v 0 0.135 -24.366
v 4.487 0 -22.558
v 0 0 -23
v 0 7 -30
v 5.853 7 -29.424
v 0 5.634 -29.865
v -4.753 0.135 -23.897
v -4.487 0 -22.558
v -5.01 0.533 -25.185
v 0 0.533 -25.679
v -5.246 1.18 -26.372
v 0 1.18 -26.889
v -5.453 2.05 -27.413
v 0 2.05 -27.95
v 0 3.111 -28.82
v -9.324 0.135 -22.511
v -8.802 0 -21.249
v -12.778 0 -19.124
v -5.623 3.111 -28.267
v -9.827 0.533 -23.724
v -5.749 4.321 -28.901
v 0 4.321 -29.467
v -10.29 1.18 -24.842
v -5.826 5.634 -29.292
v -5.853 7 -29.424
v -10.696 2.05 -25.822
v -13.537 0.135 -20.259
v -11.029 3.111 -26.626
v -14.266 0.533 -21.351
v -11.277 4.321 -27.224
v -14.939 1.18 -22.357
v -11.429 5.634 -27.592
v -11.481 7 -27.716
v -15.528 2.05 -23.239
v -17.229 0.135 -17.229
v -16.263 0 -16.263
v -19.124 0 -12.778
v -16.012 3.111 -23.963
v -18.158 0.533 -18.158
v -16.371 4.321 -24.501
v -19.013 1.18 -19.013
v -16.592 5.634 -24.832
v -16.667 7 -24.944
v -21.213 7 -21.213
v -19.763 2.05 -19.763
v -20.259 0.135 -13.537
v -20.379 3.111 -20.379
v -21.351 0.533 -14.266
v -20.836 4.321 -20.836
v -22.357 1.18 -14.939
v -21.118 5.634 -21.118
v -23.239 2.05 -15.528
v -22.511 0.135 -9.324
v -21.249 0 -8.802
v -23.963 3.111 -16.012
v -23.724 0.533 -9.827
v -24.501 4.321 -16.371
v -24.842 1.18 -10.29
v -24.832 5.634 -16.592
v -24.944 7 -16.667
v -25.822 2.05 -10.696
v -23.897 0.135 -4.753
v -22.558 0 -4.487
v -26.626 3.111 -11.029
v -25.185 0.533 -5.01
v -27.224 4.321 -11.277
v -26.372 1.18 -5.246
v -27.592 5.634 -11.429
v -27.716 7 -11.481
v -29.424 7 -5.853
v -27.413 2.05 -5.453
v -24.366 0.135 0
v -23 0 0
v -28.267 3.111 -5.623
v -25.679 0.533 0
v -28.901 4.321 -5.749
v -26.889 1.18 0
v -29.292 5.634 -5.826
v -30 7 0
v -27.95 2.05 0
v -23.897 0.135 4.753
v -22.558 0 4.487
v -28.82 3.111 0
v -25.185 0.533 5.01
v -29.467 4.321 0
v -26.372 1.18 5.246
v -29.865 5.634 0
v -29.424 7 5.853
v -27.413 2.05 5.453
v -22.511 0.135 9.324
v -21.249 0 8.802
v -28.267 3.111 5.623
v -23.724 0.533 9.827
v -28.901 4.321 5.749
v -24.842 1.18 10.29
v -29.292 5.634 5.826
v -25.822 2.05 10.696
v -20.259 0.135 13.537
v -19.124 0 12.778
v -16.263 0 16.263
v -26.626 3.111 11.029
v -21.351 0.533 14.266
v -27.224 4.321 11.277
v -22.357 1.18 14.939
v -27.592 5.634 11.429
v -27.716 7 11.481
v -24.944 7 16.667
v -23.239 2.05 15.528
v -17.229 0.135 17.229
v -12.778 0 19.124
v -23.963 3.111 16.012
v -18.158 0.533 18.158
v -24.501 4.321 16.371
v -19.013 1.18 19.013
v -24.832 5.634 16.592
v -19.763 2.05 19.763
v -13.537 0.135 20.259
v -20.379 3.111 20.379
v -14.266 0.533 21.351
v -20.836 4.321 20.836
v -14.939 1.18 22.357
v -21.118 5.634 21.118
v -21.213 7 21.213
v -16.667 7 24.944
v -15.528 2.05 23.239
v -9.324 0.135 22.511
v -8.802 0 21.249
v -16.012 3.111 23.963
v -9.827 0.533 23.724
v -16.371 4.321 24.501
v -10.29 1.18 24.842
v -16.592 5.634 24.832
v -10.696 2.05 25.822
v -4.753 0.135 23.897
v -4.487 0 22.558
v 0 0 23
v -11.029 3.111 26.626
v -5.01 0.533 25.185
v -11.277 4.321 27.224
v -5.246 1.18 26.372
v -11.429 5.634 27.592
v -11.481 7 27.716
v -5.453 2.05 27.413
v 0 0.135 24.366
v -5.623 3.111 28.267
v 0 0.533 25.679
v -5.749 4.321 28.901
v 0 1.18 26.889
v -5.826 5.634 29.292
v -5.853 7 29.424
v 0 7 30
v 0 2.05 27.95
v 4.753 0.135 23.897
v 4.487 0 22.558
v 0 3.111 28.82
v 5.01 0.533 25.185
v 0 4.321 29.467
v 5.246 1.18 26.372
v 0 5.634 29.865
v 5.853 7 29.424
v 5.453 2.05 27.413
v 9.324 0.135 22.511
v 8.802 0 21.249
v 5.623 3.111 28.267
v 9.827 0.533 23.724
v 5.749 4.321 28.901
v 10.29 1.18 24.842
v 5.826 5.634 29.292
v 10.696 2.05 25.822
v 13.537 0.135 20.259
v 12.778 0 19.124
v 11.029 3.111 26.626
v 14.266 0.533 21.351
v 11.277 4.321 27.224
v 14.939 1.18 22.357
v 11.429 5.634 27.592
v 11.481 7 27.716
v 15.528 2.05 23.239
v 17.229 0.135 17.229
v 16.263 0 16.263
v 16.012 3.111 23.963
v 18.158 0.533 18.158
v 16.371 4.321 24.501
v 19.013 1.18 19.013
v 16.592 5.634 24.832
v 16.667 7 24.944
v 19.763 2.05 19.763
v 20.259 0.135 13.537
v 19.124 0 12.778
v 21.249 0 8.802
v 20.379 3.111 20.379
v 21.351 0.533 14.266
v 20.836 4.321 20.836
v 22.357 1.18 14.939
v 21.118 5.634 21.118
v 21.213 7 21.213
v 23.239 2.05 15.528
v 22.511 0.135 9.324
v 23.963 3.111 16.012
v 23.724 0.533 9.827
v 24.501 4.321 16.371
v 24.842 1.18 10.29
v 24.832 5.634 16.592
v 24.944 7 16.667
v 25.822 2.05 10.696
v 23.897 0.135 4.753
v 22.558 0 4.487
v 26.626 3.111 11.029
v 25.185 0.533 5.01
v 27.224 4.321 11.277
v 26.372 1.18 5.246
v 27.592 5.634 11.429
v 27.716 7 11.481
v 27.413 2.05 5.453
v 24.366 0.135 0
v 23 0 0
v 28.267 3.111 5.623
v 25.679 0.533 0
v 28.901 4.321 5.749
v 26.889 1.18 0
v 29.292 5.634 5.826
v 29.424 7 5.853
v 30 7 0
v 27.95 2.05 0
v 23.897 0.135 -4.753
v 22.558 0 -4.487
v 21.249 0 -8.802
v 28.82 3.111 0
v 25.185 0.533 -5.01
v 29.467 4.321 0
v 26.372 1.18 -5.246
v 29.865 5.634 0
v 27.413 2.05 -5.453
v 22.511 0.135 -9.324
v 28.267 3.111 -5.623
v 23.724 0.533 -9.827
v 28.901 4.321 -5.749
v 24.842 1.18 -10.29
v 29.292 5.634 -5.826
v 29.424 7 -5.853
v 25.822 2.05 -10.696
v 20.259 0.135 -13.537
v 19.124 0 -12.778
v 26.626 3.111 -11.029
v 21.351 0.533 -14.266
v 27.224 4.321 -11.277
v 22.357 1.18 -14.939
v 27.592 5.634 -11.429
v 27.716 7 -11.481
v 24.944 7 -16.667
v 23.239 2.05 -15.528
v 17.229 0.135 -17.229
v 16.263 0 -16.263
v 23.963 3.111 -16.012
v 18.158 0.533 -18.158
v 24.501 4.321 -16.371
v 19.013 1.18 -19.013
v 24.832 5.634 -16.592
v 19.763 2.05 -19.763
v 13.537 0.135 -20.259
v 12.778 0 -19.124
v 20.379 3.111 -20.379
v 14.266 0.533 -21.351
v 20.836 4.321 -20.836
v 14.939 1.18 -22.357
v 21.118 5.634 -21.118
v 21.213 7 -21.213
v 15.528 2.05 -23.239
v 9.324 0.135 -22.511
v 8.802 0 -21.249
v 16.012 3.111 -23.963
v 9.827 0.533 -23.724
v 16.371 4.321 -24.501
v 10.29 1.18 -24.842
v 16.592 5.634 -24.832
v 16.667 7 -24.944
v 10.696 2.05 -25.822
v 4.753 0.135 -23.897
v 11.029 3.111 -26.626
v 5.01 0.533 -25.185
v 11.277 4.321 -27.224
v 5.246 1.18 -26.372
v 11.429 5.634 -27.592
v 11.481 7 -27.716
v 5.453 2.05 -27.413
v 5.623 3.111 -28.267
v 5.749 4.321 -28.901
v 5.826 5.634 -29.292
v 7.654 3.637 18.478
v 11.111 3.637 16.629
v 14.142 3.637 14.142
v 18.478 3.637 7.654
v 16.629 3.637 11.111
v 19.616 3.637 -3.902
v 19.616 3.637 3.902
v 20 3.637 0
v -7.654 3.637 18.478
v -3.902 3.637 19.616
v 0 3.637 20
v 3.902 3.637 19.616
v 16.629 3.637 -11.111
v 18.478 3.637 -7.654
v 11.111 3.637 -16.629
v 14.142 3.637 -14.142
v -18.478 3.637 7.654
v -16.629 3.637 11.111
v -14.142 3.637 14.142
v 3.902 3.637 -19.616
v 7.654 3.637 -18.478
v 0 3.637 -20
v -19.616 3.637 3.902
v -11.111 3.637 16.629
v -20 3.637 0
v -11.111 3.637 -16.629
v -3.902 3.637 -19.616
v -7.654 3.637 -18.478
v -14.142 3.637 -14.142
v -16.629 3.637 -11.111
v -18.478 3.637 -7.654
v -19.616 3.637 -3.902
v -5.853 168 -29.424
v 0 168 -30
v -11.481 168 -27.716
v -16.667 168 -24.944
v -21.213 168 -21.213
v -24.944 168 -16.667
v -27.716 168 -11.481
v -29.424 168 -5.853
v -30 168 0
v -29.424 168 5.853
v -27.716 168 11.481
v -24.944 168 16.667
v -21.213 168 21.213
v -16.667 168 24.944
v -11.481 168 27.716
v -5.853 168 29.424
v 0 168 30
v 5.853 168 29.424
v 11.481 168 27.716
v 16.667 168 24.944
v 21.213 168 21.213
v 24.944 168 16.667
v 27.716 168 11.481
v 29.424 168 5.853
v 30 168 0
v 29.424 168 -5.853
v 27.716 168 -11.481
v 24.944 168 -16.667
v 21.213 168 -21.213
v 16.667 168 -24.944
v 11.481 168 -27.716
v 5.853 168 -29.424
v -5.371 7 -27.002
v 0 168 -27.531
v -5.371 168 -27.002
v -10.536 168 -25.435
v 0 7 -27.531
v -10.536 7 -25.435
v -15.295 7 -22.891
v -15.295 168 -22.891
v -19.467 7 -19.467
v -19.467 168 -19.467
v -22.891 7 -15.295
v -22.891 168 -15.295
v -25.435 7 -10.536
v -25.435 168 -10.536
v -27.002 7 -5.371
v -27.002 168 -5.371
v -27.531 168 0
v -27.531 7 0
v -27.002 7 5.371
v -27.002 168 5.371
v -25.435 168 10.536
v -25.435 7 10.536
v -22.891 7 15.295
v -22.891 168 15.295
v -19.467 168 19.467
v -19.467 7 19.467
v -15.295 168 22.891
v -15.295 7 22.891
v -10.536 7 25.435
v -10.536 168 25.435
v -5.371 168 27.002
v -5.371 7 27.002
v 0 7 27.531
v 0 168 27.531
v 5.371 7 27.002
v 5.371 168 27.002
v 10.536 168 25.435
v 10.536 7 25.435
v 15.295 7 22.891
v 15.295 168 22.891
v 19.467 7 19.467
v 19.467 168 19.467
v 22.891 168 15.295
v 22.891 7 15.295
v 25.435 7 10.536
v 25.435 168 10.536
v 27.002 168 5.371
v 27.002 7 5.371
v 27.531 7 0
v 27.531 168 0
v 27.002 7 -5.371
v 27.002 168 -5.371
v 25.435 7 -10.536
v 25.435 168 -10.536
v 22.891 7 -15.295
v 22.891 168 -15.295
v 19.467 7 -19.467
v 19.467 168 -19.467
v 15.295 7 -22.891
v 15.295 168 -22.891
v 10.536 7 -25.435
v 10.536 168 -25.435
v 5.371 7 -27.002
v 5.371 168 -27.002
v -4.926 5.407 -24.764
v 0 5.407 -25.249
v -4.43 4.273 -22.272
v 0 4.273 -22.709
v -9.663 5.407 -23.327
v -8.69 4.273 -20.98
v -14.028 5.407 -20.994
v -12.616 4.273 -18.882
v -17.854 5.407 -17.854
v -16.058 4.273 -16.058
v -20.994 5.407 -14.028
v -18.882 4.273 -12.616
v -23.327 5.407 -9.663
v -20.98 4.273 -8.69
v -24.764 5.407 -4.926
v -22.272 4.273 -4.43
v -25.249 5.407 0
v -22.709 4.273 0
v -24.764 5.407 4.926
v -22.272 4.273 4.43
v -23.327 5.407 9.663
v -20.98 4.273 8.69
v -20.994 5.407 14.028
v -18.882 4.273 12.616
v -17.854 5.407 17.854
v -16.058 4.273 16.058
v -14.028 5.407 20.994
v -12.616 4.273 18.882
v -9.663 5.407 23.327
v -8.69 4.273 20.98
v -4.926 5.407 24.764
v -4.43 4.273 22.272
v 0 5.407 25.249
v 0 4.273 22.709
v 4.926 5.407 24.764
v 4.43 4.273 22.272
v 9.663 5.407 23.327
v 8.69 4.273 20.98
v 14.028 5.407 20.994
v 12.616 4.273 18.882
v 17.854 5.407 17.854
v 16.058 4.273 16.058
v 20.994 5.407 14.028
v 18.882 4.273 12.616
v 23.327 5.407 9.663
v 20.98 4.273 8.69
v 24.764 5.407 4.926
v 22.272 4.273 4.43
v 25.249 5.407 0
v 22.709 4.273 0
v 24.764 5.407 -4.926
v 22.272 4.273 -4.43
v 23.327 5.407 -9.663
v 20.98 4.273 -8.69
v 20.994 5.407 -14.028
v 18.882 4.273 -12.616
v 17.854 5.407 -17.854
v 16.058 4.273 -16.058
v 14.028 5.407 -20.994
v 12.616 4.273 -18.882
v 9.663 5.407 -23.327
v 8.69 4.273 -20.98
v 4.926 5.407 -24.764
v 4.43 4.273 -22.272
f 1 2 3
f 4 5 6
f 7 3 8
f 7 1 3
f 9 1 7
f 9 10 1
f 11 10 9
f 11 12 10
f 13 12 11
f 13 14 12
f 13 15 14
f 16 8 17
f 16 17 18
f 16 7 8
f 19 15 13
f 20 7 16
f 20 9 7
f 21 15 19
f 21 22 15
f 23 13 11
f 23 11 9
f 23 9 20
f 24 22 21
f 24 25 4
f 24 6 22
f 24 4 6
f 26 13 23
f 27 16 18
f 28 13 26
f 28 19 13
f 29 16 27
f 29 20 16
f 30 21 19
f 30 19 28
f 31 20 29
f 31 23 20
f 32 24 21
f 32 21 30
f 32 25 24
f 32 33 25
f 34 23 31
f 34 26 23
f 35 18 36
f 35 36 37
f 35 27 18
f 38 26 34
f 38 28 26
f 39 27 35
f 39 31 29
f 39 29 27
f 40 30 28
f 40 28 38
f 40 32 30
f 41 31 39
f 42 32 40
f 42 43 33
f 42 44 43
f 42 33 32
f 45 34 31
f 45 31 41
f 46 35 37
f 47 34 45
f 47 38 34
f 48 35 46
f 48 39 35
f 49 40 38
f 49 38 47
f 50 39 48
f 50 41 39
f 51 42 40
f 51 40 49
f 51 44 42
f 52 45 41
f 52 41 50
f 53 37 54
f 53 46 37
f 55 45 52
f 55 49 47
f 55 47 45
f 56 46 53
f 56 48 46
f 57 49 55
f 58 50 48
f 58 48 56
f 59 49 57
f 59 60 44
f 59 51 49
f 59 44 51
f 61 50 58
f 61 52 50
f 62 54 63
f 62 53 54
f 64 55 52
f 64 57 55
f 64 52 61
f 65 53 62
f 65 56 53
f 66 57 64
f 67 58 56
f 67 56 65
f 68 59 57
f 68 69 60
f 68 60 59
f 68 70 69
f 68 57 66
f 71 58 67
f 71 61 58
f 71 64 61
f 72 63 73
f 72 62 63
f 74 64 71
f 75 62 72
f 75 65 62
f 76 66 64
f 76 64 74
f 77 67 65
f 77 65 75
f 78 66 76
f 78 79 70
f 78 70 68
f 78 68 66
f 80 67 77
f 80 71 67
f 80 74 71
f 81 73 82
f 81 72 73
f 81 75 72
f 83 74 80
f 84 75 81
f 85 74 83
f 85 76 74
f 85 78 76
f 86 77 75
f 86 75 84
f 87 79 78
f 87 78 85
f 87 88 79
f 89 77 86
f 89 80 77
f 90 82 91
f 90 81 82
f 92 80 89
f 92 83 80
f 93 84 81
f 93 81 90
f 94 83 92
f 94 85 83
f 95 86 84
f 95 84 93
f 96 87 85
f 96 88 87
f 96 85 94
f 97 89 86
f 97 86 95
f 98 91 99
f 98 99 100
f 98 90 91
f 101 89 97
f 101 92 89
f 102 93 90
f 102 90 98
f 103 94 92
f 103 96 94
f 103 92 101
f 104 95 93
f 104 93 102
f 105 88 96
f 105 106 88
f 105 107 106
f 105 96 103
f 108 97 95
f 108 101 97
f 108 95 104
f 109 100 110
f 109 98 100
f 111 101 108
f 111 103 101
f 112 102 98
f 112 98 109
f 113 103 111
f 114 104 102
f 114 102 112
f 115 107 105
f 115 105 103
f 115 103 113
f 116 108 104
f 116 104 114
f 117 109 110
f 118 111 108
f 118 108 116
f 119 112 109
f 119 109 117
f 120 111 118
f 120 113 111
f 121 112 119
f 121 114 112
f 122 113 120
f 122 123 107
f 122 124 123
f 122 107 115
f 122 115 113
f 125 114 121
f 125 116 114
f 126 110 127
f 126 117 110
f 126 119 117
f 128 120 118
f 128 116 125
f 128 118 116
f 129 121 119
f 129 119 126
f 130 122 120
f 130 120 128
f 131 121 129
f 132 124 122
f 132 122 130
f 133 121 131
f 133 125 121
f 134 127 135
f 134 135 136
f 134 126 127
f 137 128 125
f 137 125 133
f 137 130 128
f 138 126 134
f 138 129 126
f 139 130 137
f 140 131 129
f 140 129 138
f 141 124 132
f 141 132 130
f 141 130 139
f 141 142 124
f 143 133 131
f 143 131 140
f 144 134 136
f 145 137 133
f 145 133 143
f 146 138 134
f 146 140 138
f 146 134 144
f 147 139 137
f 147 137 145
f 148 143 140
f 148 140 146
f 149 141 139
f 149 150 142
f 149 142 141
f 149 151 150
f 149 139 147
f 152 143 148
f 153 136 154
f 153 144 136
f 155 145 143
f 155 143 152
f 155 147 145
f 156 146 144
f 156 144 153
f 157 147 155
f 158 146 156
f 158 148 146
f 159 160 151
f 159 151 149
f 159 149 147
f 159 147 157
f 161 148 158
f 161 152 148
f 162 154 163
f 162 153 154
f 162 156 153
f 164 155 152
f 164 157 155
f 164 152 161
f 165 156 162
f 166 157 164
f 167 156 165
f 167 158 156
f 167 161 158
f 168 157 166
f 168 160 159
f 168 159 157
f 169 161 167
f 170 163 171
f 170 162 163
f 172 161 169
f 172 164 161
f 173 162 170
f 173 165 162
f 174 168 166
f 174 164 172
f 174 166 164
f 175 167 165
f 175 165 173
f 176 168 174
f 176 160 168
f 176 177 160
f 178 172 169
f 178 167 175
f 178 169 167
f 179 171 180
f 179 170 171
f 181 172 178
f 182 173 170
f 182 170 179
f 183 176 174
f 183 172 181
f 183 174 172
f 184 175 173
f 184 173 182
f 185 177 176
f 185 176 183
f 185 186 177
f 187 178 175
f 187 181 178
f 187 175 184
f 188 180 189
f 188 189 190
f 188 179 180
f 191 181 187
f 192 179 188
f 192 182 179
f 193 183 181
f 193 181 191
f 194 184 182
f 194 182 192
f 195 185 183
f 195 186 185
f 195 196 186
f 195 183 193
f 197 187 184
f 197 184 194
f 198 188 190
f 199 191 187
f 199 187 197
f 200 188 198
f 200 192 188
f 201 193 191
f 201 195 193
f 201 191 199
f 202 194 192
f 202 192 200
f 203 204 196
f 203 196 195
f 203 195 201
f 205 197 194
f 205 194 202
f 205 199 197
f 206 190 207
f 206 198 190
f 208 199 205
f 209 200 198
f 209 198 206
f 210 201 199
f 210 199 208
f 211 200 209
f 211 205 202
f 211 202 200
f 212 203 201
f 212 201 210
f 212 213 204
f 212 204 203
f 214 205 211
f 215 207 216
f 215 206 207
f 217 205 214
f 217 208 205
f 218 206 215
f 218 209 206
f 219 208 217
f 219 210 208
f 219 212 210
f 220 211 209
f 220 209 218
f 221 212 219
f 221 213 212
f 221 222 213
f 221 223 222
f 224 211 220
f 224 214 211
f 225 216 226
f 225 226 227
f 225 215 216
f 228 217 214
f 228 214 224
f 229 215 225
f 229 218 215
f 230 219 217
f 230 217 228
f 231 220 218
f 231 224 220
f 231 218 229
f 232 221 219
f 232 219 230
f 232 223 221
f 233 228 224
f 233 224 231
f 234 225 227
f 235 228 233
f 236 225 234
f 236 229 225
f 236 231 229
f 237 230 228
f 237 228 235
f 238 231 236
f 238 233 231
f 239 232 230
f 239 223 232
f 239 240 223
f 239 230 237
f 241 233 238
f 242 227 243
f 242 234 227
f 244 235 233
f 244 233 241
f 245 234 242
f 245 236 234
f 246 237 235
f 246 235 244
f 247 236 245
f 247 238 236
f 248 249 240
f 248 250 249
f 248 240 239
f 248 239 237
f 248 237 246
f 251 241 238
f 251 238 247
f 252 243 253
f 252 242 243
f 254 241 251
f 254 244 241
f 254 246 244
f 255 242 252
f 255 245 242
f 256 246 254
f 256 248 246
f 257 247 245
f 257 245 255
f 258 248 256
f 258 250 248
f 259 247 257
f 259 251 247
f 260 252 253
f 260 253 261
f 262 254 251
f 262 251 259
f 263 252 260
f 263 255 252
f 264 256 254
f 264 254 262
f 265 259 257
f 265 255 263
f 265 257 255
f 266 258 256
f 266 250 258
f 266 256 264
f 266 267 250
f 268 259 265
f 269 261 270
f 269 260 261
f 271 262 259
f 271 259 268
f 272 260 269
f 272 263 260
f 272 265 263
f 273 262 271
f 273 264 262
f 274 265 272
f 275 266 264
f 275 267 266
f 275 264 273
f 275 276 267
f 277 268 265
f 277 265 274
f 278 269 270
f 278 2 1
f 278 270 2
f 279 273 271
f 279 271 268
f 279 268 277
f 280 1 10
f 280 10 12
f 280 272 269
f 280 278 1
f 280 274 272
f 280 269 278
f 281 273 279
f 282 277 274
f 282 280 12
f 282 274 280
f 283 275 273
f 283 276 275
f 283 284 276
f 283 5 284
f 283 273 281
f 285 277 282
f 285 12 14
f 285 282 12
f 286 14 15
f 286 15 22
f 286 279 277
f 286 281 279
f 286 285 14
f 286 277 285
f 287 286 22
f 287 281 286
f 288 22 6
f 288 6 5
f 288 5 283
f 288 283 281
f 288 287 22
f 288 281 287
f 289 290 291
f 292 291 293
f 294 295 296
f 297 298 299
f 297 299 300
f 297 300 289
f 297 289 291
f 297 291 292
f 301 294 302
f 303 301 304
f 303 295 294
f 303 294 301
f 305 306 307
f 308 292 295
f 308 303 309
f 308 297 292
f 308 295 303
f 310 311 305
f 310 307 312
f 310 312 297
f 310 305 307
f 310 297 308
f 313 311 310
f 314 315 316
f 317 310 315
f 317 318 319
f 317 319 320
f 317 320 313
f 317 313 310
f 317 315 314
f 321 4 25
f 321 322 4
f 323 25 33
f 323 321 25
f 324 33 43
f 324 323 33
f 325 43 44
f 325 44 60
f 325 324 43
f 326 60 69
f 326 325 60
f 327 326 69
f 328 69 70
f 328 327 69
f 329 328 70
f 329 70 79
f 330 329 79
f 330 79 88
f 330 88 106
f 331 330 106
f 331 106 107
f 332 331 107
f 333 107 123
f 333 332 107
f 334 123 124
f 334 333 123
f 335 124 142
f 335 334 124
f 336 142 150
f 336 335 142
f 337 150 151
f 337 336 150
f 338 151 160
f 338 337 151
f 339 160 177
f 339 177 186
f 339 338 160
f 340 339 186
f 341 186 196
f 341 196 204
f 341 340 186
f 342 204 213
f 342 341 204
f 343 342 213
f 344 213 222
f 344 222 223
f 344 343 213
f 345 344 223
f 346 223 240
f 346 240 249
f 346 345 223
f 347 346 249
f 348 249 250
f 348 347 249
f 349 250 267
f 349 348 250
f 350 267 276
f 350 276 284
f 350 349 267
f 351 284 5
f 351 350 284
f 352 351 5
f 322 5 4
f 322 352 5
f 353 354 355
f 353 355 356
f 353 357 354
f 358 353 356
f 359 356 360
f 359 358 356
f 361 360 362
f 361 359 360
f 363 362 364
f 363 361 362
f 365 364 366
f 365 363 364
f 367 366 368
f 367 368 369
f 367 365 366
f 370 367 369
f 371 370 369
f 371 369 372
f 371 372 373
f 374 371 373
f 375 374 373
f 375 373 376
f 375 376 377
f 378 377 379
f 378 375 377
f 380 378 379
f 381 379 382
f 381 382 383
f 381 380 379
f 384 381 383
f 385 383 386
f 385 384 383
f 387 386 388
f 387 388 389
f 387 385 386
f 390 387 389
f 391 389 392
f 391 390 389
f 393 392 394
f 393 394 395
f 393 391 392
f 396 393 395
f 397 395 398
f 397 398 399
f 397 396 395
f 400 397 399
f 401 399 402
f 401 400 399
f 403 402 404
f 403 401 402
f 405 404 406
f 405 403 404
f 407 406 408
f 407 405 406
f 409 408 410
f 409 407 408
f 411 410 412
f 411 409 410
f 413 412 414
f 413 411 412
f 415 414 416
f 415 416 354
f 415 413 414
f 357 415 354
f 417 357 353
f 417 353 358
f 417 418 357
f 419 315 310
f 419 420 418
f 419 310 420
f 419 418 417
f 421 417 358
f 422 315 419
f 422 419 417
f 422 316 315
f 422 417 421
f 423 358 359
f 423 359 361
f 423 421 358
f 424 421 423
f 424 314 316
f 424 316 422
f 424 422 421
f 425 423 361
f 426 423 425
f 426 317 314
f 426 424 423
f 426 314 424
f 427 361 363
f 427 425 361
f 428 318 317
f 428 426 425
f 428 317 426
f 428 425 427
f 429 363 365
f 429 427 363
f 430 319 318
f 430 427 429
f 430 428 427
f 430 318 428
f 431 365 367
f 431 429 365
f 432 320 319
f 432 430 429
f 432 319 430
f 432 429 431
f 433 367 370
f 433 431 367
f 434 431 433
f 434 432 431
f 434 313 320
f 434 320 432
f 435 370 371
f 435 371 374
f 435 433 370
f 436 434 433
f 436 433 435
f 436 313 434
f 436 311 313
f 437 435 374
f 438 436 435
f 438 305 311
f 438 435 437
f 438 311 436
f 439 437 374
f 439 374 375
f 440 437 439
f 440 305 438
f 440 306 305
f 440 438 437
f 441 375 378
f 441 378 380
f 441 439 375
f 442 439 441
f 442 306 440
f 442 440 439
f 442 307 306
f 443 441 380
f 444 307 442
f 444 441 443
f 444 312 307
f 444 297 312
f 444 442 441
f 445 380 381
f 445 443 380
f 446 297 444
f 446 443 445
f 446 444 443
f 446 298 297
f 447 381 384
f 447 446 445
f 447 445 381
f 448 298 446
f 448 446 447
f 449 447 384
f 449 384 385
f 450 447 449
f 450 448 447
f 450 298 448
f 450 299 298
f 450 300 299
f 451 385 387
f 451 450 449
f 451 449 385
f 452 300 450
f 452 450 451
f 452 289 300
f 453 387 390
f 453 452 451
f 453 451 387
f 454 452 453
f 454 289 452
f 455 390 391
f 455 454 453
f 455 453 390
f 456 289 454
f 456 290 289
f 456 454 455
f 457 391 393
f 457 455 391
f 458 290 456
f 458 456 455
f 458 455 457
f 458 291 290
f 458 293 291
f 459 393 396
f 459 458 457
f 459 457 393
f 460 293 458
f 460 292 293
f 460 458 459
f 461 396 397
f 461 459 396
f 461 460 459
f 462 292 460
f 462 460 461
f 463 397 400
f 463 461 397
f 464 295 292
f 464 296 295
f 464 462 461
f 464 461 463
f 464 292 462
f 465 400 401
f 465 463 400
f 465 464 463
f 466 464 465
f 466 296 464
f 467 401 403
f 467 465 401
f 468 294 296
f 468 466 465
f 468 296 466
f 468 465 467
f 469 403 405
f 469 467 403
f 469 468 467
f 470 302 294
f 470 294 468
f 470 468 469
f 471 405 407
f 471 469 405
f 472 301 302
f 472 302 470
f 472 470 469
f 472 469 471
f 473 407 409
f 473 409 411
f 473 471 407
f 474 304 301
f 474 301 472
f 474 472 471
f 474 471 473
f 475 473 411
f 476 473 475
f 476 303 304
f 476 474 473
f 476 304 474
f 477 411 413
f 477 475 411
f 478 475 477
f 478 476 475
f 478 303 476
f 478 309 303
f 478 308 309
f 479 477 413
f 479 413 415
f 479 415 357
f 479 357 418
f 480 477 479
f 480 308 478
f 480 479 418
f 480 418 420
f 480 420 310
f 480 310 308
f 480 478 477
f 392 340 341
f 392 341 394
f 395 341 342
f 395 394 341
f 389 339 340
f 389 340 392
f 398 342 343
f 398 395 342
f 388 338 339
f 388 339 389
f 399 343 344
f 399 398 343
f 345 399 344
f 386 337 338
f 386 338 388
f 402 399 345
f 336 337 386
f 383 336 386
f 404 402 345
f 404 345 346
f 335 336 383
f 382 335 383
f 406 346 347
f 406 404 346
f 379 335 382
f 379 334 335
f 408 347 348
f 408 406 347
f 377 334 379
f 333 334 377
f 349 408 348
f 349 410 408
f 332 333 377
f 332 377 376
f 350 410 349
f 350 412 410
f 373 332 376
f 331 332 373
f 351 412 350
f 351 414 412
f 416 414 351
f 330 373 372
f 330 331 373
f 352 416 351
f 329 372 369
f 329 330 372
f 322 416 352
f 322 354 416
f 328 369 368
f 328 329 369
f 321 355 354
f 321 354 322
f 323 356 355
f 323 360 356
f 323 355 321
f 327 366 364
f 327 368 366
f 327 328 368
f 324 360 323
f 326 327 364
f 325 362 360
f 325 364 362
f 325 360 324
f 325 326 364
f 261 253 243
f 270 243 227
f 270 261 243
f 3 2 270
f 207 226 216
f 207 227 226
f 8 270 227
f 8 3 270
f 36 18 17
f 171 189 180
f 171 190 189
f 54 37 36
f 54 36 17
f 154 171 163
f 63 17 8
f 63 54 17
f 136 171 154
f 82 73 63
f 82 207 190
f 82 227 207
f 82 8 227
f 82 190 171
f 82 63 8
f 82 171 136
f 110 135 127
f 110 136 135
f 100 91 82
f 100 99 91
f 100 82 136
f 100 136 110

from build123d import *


with BuildPart() as part:
    # Sketch2 → Revolve1 (revolve)
    with BuildSketch(Plane.XY, mode=Mode.PRIVATE) as revolve1_sk:
        with BuildLine():
            Line((27.530975966, 168), (27.530975966, 7))
            ThreePointArc((27.530975966, 7), (24.005991012, 4.779859802), (20, 3.636803621))
            Line((20, 3.636803621), (0, 3.636803621))
            Line((0, 3.636803621), (0, 0))
            Line((0, 0), (23, 0))
            ThreePointArc((23, 0), (27.949747468, 2.050252532), (30, 7))
            Line((30, 7), (30, 168))
            Line((30, 168), (27.530975966, 168))
        make_face()
    revolve(revolve1_sk.sketch.rotate(Axis((0, 0, 0), (0, 1, 0)), 90), axis=Axis((0, 0, 0), (0, 1, 0)))


solid = part.part
